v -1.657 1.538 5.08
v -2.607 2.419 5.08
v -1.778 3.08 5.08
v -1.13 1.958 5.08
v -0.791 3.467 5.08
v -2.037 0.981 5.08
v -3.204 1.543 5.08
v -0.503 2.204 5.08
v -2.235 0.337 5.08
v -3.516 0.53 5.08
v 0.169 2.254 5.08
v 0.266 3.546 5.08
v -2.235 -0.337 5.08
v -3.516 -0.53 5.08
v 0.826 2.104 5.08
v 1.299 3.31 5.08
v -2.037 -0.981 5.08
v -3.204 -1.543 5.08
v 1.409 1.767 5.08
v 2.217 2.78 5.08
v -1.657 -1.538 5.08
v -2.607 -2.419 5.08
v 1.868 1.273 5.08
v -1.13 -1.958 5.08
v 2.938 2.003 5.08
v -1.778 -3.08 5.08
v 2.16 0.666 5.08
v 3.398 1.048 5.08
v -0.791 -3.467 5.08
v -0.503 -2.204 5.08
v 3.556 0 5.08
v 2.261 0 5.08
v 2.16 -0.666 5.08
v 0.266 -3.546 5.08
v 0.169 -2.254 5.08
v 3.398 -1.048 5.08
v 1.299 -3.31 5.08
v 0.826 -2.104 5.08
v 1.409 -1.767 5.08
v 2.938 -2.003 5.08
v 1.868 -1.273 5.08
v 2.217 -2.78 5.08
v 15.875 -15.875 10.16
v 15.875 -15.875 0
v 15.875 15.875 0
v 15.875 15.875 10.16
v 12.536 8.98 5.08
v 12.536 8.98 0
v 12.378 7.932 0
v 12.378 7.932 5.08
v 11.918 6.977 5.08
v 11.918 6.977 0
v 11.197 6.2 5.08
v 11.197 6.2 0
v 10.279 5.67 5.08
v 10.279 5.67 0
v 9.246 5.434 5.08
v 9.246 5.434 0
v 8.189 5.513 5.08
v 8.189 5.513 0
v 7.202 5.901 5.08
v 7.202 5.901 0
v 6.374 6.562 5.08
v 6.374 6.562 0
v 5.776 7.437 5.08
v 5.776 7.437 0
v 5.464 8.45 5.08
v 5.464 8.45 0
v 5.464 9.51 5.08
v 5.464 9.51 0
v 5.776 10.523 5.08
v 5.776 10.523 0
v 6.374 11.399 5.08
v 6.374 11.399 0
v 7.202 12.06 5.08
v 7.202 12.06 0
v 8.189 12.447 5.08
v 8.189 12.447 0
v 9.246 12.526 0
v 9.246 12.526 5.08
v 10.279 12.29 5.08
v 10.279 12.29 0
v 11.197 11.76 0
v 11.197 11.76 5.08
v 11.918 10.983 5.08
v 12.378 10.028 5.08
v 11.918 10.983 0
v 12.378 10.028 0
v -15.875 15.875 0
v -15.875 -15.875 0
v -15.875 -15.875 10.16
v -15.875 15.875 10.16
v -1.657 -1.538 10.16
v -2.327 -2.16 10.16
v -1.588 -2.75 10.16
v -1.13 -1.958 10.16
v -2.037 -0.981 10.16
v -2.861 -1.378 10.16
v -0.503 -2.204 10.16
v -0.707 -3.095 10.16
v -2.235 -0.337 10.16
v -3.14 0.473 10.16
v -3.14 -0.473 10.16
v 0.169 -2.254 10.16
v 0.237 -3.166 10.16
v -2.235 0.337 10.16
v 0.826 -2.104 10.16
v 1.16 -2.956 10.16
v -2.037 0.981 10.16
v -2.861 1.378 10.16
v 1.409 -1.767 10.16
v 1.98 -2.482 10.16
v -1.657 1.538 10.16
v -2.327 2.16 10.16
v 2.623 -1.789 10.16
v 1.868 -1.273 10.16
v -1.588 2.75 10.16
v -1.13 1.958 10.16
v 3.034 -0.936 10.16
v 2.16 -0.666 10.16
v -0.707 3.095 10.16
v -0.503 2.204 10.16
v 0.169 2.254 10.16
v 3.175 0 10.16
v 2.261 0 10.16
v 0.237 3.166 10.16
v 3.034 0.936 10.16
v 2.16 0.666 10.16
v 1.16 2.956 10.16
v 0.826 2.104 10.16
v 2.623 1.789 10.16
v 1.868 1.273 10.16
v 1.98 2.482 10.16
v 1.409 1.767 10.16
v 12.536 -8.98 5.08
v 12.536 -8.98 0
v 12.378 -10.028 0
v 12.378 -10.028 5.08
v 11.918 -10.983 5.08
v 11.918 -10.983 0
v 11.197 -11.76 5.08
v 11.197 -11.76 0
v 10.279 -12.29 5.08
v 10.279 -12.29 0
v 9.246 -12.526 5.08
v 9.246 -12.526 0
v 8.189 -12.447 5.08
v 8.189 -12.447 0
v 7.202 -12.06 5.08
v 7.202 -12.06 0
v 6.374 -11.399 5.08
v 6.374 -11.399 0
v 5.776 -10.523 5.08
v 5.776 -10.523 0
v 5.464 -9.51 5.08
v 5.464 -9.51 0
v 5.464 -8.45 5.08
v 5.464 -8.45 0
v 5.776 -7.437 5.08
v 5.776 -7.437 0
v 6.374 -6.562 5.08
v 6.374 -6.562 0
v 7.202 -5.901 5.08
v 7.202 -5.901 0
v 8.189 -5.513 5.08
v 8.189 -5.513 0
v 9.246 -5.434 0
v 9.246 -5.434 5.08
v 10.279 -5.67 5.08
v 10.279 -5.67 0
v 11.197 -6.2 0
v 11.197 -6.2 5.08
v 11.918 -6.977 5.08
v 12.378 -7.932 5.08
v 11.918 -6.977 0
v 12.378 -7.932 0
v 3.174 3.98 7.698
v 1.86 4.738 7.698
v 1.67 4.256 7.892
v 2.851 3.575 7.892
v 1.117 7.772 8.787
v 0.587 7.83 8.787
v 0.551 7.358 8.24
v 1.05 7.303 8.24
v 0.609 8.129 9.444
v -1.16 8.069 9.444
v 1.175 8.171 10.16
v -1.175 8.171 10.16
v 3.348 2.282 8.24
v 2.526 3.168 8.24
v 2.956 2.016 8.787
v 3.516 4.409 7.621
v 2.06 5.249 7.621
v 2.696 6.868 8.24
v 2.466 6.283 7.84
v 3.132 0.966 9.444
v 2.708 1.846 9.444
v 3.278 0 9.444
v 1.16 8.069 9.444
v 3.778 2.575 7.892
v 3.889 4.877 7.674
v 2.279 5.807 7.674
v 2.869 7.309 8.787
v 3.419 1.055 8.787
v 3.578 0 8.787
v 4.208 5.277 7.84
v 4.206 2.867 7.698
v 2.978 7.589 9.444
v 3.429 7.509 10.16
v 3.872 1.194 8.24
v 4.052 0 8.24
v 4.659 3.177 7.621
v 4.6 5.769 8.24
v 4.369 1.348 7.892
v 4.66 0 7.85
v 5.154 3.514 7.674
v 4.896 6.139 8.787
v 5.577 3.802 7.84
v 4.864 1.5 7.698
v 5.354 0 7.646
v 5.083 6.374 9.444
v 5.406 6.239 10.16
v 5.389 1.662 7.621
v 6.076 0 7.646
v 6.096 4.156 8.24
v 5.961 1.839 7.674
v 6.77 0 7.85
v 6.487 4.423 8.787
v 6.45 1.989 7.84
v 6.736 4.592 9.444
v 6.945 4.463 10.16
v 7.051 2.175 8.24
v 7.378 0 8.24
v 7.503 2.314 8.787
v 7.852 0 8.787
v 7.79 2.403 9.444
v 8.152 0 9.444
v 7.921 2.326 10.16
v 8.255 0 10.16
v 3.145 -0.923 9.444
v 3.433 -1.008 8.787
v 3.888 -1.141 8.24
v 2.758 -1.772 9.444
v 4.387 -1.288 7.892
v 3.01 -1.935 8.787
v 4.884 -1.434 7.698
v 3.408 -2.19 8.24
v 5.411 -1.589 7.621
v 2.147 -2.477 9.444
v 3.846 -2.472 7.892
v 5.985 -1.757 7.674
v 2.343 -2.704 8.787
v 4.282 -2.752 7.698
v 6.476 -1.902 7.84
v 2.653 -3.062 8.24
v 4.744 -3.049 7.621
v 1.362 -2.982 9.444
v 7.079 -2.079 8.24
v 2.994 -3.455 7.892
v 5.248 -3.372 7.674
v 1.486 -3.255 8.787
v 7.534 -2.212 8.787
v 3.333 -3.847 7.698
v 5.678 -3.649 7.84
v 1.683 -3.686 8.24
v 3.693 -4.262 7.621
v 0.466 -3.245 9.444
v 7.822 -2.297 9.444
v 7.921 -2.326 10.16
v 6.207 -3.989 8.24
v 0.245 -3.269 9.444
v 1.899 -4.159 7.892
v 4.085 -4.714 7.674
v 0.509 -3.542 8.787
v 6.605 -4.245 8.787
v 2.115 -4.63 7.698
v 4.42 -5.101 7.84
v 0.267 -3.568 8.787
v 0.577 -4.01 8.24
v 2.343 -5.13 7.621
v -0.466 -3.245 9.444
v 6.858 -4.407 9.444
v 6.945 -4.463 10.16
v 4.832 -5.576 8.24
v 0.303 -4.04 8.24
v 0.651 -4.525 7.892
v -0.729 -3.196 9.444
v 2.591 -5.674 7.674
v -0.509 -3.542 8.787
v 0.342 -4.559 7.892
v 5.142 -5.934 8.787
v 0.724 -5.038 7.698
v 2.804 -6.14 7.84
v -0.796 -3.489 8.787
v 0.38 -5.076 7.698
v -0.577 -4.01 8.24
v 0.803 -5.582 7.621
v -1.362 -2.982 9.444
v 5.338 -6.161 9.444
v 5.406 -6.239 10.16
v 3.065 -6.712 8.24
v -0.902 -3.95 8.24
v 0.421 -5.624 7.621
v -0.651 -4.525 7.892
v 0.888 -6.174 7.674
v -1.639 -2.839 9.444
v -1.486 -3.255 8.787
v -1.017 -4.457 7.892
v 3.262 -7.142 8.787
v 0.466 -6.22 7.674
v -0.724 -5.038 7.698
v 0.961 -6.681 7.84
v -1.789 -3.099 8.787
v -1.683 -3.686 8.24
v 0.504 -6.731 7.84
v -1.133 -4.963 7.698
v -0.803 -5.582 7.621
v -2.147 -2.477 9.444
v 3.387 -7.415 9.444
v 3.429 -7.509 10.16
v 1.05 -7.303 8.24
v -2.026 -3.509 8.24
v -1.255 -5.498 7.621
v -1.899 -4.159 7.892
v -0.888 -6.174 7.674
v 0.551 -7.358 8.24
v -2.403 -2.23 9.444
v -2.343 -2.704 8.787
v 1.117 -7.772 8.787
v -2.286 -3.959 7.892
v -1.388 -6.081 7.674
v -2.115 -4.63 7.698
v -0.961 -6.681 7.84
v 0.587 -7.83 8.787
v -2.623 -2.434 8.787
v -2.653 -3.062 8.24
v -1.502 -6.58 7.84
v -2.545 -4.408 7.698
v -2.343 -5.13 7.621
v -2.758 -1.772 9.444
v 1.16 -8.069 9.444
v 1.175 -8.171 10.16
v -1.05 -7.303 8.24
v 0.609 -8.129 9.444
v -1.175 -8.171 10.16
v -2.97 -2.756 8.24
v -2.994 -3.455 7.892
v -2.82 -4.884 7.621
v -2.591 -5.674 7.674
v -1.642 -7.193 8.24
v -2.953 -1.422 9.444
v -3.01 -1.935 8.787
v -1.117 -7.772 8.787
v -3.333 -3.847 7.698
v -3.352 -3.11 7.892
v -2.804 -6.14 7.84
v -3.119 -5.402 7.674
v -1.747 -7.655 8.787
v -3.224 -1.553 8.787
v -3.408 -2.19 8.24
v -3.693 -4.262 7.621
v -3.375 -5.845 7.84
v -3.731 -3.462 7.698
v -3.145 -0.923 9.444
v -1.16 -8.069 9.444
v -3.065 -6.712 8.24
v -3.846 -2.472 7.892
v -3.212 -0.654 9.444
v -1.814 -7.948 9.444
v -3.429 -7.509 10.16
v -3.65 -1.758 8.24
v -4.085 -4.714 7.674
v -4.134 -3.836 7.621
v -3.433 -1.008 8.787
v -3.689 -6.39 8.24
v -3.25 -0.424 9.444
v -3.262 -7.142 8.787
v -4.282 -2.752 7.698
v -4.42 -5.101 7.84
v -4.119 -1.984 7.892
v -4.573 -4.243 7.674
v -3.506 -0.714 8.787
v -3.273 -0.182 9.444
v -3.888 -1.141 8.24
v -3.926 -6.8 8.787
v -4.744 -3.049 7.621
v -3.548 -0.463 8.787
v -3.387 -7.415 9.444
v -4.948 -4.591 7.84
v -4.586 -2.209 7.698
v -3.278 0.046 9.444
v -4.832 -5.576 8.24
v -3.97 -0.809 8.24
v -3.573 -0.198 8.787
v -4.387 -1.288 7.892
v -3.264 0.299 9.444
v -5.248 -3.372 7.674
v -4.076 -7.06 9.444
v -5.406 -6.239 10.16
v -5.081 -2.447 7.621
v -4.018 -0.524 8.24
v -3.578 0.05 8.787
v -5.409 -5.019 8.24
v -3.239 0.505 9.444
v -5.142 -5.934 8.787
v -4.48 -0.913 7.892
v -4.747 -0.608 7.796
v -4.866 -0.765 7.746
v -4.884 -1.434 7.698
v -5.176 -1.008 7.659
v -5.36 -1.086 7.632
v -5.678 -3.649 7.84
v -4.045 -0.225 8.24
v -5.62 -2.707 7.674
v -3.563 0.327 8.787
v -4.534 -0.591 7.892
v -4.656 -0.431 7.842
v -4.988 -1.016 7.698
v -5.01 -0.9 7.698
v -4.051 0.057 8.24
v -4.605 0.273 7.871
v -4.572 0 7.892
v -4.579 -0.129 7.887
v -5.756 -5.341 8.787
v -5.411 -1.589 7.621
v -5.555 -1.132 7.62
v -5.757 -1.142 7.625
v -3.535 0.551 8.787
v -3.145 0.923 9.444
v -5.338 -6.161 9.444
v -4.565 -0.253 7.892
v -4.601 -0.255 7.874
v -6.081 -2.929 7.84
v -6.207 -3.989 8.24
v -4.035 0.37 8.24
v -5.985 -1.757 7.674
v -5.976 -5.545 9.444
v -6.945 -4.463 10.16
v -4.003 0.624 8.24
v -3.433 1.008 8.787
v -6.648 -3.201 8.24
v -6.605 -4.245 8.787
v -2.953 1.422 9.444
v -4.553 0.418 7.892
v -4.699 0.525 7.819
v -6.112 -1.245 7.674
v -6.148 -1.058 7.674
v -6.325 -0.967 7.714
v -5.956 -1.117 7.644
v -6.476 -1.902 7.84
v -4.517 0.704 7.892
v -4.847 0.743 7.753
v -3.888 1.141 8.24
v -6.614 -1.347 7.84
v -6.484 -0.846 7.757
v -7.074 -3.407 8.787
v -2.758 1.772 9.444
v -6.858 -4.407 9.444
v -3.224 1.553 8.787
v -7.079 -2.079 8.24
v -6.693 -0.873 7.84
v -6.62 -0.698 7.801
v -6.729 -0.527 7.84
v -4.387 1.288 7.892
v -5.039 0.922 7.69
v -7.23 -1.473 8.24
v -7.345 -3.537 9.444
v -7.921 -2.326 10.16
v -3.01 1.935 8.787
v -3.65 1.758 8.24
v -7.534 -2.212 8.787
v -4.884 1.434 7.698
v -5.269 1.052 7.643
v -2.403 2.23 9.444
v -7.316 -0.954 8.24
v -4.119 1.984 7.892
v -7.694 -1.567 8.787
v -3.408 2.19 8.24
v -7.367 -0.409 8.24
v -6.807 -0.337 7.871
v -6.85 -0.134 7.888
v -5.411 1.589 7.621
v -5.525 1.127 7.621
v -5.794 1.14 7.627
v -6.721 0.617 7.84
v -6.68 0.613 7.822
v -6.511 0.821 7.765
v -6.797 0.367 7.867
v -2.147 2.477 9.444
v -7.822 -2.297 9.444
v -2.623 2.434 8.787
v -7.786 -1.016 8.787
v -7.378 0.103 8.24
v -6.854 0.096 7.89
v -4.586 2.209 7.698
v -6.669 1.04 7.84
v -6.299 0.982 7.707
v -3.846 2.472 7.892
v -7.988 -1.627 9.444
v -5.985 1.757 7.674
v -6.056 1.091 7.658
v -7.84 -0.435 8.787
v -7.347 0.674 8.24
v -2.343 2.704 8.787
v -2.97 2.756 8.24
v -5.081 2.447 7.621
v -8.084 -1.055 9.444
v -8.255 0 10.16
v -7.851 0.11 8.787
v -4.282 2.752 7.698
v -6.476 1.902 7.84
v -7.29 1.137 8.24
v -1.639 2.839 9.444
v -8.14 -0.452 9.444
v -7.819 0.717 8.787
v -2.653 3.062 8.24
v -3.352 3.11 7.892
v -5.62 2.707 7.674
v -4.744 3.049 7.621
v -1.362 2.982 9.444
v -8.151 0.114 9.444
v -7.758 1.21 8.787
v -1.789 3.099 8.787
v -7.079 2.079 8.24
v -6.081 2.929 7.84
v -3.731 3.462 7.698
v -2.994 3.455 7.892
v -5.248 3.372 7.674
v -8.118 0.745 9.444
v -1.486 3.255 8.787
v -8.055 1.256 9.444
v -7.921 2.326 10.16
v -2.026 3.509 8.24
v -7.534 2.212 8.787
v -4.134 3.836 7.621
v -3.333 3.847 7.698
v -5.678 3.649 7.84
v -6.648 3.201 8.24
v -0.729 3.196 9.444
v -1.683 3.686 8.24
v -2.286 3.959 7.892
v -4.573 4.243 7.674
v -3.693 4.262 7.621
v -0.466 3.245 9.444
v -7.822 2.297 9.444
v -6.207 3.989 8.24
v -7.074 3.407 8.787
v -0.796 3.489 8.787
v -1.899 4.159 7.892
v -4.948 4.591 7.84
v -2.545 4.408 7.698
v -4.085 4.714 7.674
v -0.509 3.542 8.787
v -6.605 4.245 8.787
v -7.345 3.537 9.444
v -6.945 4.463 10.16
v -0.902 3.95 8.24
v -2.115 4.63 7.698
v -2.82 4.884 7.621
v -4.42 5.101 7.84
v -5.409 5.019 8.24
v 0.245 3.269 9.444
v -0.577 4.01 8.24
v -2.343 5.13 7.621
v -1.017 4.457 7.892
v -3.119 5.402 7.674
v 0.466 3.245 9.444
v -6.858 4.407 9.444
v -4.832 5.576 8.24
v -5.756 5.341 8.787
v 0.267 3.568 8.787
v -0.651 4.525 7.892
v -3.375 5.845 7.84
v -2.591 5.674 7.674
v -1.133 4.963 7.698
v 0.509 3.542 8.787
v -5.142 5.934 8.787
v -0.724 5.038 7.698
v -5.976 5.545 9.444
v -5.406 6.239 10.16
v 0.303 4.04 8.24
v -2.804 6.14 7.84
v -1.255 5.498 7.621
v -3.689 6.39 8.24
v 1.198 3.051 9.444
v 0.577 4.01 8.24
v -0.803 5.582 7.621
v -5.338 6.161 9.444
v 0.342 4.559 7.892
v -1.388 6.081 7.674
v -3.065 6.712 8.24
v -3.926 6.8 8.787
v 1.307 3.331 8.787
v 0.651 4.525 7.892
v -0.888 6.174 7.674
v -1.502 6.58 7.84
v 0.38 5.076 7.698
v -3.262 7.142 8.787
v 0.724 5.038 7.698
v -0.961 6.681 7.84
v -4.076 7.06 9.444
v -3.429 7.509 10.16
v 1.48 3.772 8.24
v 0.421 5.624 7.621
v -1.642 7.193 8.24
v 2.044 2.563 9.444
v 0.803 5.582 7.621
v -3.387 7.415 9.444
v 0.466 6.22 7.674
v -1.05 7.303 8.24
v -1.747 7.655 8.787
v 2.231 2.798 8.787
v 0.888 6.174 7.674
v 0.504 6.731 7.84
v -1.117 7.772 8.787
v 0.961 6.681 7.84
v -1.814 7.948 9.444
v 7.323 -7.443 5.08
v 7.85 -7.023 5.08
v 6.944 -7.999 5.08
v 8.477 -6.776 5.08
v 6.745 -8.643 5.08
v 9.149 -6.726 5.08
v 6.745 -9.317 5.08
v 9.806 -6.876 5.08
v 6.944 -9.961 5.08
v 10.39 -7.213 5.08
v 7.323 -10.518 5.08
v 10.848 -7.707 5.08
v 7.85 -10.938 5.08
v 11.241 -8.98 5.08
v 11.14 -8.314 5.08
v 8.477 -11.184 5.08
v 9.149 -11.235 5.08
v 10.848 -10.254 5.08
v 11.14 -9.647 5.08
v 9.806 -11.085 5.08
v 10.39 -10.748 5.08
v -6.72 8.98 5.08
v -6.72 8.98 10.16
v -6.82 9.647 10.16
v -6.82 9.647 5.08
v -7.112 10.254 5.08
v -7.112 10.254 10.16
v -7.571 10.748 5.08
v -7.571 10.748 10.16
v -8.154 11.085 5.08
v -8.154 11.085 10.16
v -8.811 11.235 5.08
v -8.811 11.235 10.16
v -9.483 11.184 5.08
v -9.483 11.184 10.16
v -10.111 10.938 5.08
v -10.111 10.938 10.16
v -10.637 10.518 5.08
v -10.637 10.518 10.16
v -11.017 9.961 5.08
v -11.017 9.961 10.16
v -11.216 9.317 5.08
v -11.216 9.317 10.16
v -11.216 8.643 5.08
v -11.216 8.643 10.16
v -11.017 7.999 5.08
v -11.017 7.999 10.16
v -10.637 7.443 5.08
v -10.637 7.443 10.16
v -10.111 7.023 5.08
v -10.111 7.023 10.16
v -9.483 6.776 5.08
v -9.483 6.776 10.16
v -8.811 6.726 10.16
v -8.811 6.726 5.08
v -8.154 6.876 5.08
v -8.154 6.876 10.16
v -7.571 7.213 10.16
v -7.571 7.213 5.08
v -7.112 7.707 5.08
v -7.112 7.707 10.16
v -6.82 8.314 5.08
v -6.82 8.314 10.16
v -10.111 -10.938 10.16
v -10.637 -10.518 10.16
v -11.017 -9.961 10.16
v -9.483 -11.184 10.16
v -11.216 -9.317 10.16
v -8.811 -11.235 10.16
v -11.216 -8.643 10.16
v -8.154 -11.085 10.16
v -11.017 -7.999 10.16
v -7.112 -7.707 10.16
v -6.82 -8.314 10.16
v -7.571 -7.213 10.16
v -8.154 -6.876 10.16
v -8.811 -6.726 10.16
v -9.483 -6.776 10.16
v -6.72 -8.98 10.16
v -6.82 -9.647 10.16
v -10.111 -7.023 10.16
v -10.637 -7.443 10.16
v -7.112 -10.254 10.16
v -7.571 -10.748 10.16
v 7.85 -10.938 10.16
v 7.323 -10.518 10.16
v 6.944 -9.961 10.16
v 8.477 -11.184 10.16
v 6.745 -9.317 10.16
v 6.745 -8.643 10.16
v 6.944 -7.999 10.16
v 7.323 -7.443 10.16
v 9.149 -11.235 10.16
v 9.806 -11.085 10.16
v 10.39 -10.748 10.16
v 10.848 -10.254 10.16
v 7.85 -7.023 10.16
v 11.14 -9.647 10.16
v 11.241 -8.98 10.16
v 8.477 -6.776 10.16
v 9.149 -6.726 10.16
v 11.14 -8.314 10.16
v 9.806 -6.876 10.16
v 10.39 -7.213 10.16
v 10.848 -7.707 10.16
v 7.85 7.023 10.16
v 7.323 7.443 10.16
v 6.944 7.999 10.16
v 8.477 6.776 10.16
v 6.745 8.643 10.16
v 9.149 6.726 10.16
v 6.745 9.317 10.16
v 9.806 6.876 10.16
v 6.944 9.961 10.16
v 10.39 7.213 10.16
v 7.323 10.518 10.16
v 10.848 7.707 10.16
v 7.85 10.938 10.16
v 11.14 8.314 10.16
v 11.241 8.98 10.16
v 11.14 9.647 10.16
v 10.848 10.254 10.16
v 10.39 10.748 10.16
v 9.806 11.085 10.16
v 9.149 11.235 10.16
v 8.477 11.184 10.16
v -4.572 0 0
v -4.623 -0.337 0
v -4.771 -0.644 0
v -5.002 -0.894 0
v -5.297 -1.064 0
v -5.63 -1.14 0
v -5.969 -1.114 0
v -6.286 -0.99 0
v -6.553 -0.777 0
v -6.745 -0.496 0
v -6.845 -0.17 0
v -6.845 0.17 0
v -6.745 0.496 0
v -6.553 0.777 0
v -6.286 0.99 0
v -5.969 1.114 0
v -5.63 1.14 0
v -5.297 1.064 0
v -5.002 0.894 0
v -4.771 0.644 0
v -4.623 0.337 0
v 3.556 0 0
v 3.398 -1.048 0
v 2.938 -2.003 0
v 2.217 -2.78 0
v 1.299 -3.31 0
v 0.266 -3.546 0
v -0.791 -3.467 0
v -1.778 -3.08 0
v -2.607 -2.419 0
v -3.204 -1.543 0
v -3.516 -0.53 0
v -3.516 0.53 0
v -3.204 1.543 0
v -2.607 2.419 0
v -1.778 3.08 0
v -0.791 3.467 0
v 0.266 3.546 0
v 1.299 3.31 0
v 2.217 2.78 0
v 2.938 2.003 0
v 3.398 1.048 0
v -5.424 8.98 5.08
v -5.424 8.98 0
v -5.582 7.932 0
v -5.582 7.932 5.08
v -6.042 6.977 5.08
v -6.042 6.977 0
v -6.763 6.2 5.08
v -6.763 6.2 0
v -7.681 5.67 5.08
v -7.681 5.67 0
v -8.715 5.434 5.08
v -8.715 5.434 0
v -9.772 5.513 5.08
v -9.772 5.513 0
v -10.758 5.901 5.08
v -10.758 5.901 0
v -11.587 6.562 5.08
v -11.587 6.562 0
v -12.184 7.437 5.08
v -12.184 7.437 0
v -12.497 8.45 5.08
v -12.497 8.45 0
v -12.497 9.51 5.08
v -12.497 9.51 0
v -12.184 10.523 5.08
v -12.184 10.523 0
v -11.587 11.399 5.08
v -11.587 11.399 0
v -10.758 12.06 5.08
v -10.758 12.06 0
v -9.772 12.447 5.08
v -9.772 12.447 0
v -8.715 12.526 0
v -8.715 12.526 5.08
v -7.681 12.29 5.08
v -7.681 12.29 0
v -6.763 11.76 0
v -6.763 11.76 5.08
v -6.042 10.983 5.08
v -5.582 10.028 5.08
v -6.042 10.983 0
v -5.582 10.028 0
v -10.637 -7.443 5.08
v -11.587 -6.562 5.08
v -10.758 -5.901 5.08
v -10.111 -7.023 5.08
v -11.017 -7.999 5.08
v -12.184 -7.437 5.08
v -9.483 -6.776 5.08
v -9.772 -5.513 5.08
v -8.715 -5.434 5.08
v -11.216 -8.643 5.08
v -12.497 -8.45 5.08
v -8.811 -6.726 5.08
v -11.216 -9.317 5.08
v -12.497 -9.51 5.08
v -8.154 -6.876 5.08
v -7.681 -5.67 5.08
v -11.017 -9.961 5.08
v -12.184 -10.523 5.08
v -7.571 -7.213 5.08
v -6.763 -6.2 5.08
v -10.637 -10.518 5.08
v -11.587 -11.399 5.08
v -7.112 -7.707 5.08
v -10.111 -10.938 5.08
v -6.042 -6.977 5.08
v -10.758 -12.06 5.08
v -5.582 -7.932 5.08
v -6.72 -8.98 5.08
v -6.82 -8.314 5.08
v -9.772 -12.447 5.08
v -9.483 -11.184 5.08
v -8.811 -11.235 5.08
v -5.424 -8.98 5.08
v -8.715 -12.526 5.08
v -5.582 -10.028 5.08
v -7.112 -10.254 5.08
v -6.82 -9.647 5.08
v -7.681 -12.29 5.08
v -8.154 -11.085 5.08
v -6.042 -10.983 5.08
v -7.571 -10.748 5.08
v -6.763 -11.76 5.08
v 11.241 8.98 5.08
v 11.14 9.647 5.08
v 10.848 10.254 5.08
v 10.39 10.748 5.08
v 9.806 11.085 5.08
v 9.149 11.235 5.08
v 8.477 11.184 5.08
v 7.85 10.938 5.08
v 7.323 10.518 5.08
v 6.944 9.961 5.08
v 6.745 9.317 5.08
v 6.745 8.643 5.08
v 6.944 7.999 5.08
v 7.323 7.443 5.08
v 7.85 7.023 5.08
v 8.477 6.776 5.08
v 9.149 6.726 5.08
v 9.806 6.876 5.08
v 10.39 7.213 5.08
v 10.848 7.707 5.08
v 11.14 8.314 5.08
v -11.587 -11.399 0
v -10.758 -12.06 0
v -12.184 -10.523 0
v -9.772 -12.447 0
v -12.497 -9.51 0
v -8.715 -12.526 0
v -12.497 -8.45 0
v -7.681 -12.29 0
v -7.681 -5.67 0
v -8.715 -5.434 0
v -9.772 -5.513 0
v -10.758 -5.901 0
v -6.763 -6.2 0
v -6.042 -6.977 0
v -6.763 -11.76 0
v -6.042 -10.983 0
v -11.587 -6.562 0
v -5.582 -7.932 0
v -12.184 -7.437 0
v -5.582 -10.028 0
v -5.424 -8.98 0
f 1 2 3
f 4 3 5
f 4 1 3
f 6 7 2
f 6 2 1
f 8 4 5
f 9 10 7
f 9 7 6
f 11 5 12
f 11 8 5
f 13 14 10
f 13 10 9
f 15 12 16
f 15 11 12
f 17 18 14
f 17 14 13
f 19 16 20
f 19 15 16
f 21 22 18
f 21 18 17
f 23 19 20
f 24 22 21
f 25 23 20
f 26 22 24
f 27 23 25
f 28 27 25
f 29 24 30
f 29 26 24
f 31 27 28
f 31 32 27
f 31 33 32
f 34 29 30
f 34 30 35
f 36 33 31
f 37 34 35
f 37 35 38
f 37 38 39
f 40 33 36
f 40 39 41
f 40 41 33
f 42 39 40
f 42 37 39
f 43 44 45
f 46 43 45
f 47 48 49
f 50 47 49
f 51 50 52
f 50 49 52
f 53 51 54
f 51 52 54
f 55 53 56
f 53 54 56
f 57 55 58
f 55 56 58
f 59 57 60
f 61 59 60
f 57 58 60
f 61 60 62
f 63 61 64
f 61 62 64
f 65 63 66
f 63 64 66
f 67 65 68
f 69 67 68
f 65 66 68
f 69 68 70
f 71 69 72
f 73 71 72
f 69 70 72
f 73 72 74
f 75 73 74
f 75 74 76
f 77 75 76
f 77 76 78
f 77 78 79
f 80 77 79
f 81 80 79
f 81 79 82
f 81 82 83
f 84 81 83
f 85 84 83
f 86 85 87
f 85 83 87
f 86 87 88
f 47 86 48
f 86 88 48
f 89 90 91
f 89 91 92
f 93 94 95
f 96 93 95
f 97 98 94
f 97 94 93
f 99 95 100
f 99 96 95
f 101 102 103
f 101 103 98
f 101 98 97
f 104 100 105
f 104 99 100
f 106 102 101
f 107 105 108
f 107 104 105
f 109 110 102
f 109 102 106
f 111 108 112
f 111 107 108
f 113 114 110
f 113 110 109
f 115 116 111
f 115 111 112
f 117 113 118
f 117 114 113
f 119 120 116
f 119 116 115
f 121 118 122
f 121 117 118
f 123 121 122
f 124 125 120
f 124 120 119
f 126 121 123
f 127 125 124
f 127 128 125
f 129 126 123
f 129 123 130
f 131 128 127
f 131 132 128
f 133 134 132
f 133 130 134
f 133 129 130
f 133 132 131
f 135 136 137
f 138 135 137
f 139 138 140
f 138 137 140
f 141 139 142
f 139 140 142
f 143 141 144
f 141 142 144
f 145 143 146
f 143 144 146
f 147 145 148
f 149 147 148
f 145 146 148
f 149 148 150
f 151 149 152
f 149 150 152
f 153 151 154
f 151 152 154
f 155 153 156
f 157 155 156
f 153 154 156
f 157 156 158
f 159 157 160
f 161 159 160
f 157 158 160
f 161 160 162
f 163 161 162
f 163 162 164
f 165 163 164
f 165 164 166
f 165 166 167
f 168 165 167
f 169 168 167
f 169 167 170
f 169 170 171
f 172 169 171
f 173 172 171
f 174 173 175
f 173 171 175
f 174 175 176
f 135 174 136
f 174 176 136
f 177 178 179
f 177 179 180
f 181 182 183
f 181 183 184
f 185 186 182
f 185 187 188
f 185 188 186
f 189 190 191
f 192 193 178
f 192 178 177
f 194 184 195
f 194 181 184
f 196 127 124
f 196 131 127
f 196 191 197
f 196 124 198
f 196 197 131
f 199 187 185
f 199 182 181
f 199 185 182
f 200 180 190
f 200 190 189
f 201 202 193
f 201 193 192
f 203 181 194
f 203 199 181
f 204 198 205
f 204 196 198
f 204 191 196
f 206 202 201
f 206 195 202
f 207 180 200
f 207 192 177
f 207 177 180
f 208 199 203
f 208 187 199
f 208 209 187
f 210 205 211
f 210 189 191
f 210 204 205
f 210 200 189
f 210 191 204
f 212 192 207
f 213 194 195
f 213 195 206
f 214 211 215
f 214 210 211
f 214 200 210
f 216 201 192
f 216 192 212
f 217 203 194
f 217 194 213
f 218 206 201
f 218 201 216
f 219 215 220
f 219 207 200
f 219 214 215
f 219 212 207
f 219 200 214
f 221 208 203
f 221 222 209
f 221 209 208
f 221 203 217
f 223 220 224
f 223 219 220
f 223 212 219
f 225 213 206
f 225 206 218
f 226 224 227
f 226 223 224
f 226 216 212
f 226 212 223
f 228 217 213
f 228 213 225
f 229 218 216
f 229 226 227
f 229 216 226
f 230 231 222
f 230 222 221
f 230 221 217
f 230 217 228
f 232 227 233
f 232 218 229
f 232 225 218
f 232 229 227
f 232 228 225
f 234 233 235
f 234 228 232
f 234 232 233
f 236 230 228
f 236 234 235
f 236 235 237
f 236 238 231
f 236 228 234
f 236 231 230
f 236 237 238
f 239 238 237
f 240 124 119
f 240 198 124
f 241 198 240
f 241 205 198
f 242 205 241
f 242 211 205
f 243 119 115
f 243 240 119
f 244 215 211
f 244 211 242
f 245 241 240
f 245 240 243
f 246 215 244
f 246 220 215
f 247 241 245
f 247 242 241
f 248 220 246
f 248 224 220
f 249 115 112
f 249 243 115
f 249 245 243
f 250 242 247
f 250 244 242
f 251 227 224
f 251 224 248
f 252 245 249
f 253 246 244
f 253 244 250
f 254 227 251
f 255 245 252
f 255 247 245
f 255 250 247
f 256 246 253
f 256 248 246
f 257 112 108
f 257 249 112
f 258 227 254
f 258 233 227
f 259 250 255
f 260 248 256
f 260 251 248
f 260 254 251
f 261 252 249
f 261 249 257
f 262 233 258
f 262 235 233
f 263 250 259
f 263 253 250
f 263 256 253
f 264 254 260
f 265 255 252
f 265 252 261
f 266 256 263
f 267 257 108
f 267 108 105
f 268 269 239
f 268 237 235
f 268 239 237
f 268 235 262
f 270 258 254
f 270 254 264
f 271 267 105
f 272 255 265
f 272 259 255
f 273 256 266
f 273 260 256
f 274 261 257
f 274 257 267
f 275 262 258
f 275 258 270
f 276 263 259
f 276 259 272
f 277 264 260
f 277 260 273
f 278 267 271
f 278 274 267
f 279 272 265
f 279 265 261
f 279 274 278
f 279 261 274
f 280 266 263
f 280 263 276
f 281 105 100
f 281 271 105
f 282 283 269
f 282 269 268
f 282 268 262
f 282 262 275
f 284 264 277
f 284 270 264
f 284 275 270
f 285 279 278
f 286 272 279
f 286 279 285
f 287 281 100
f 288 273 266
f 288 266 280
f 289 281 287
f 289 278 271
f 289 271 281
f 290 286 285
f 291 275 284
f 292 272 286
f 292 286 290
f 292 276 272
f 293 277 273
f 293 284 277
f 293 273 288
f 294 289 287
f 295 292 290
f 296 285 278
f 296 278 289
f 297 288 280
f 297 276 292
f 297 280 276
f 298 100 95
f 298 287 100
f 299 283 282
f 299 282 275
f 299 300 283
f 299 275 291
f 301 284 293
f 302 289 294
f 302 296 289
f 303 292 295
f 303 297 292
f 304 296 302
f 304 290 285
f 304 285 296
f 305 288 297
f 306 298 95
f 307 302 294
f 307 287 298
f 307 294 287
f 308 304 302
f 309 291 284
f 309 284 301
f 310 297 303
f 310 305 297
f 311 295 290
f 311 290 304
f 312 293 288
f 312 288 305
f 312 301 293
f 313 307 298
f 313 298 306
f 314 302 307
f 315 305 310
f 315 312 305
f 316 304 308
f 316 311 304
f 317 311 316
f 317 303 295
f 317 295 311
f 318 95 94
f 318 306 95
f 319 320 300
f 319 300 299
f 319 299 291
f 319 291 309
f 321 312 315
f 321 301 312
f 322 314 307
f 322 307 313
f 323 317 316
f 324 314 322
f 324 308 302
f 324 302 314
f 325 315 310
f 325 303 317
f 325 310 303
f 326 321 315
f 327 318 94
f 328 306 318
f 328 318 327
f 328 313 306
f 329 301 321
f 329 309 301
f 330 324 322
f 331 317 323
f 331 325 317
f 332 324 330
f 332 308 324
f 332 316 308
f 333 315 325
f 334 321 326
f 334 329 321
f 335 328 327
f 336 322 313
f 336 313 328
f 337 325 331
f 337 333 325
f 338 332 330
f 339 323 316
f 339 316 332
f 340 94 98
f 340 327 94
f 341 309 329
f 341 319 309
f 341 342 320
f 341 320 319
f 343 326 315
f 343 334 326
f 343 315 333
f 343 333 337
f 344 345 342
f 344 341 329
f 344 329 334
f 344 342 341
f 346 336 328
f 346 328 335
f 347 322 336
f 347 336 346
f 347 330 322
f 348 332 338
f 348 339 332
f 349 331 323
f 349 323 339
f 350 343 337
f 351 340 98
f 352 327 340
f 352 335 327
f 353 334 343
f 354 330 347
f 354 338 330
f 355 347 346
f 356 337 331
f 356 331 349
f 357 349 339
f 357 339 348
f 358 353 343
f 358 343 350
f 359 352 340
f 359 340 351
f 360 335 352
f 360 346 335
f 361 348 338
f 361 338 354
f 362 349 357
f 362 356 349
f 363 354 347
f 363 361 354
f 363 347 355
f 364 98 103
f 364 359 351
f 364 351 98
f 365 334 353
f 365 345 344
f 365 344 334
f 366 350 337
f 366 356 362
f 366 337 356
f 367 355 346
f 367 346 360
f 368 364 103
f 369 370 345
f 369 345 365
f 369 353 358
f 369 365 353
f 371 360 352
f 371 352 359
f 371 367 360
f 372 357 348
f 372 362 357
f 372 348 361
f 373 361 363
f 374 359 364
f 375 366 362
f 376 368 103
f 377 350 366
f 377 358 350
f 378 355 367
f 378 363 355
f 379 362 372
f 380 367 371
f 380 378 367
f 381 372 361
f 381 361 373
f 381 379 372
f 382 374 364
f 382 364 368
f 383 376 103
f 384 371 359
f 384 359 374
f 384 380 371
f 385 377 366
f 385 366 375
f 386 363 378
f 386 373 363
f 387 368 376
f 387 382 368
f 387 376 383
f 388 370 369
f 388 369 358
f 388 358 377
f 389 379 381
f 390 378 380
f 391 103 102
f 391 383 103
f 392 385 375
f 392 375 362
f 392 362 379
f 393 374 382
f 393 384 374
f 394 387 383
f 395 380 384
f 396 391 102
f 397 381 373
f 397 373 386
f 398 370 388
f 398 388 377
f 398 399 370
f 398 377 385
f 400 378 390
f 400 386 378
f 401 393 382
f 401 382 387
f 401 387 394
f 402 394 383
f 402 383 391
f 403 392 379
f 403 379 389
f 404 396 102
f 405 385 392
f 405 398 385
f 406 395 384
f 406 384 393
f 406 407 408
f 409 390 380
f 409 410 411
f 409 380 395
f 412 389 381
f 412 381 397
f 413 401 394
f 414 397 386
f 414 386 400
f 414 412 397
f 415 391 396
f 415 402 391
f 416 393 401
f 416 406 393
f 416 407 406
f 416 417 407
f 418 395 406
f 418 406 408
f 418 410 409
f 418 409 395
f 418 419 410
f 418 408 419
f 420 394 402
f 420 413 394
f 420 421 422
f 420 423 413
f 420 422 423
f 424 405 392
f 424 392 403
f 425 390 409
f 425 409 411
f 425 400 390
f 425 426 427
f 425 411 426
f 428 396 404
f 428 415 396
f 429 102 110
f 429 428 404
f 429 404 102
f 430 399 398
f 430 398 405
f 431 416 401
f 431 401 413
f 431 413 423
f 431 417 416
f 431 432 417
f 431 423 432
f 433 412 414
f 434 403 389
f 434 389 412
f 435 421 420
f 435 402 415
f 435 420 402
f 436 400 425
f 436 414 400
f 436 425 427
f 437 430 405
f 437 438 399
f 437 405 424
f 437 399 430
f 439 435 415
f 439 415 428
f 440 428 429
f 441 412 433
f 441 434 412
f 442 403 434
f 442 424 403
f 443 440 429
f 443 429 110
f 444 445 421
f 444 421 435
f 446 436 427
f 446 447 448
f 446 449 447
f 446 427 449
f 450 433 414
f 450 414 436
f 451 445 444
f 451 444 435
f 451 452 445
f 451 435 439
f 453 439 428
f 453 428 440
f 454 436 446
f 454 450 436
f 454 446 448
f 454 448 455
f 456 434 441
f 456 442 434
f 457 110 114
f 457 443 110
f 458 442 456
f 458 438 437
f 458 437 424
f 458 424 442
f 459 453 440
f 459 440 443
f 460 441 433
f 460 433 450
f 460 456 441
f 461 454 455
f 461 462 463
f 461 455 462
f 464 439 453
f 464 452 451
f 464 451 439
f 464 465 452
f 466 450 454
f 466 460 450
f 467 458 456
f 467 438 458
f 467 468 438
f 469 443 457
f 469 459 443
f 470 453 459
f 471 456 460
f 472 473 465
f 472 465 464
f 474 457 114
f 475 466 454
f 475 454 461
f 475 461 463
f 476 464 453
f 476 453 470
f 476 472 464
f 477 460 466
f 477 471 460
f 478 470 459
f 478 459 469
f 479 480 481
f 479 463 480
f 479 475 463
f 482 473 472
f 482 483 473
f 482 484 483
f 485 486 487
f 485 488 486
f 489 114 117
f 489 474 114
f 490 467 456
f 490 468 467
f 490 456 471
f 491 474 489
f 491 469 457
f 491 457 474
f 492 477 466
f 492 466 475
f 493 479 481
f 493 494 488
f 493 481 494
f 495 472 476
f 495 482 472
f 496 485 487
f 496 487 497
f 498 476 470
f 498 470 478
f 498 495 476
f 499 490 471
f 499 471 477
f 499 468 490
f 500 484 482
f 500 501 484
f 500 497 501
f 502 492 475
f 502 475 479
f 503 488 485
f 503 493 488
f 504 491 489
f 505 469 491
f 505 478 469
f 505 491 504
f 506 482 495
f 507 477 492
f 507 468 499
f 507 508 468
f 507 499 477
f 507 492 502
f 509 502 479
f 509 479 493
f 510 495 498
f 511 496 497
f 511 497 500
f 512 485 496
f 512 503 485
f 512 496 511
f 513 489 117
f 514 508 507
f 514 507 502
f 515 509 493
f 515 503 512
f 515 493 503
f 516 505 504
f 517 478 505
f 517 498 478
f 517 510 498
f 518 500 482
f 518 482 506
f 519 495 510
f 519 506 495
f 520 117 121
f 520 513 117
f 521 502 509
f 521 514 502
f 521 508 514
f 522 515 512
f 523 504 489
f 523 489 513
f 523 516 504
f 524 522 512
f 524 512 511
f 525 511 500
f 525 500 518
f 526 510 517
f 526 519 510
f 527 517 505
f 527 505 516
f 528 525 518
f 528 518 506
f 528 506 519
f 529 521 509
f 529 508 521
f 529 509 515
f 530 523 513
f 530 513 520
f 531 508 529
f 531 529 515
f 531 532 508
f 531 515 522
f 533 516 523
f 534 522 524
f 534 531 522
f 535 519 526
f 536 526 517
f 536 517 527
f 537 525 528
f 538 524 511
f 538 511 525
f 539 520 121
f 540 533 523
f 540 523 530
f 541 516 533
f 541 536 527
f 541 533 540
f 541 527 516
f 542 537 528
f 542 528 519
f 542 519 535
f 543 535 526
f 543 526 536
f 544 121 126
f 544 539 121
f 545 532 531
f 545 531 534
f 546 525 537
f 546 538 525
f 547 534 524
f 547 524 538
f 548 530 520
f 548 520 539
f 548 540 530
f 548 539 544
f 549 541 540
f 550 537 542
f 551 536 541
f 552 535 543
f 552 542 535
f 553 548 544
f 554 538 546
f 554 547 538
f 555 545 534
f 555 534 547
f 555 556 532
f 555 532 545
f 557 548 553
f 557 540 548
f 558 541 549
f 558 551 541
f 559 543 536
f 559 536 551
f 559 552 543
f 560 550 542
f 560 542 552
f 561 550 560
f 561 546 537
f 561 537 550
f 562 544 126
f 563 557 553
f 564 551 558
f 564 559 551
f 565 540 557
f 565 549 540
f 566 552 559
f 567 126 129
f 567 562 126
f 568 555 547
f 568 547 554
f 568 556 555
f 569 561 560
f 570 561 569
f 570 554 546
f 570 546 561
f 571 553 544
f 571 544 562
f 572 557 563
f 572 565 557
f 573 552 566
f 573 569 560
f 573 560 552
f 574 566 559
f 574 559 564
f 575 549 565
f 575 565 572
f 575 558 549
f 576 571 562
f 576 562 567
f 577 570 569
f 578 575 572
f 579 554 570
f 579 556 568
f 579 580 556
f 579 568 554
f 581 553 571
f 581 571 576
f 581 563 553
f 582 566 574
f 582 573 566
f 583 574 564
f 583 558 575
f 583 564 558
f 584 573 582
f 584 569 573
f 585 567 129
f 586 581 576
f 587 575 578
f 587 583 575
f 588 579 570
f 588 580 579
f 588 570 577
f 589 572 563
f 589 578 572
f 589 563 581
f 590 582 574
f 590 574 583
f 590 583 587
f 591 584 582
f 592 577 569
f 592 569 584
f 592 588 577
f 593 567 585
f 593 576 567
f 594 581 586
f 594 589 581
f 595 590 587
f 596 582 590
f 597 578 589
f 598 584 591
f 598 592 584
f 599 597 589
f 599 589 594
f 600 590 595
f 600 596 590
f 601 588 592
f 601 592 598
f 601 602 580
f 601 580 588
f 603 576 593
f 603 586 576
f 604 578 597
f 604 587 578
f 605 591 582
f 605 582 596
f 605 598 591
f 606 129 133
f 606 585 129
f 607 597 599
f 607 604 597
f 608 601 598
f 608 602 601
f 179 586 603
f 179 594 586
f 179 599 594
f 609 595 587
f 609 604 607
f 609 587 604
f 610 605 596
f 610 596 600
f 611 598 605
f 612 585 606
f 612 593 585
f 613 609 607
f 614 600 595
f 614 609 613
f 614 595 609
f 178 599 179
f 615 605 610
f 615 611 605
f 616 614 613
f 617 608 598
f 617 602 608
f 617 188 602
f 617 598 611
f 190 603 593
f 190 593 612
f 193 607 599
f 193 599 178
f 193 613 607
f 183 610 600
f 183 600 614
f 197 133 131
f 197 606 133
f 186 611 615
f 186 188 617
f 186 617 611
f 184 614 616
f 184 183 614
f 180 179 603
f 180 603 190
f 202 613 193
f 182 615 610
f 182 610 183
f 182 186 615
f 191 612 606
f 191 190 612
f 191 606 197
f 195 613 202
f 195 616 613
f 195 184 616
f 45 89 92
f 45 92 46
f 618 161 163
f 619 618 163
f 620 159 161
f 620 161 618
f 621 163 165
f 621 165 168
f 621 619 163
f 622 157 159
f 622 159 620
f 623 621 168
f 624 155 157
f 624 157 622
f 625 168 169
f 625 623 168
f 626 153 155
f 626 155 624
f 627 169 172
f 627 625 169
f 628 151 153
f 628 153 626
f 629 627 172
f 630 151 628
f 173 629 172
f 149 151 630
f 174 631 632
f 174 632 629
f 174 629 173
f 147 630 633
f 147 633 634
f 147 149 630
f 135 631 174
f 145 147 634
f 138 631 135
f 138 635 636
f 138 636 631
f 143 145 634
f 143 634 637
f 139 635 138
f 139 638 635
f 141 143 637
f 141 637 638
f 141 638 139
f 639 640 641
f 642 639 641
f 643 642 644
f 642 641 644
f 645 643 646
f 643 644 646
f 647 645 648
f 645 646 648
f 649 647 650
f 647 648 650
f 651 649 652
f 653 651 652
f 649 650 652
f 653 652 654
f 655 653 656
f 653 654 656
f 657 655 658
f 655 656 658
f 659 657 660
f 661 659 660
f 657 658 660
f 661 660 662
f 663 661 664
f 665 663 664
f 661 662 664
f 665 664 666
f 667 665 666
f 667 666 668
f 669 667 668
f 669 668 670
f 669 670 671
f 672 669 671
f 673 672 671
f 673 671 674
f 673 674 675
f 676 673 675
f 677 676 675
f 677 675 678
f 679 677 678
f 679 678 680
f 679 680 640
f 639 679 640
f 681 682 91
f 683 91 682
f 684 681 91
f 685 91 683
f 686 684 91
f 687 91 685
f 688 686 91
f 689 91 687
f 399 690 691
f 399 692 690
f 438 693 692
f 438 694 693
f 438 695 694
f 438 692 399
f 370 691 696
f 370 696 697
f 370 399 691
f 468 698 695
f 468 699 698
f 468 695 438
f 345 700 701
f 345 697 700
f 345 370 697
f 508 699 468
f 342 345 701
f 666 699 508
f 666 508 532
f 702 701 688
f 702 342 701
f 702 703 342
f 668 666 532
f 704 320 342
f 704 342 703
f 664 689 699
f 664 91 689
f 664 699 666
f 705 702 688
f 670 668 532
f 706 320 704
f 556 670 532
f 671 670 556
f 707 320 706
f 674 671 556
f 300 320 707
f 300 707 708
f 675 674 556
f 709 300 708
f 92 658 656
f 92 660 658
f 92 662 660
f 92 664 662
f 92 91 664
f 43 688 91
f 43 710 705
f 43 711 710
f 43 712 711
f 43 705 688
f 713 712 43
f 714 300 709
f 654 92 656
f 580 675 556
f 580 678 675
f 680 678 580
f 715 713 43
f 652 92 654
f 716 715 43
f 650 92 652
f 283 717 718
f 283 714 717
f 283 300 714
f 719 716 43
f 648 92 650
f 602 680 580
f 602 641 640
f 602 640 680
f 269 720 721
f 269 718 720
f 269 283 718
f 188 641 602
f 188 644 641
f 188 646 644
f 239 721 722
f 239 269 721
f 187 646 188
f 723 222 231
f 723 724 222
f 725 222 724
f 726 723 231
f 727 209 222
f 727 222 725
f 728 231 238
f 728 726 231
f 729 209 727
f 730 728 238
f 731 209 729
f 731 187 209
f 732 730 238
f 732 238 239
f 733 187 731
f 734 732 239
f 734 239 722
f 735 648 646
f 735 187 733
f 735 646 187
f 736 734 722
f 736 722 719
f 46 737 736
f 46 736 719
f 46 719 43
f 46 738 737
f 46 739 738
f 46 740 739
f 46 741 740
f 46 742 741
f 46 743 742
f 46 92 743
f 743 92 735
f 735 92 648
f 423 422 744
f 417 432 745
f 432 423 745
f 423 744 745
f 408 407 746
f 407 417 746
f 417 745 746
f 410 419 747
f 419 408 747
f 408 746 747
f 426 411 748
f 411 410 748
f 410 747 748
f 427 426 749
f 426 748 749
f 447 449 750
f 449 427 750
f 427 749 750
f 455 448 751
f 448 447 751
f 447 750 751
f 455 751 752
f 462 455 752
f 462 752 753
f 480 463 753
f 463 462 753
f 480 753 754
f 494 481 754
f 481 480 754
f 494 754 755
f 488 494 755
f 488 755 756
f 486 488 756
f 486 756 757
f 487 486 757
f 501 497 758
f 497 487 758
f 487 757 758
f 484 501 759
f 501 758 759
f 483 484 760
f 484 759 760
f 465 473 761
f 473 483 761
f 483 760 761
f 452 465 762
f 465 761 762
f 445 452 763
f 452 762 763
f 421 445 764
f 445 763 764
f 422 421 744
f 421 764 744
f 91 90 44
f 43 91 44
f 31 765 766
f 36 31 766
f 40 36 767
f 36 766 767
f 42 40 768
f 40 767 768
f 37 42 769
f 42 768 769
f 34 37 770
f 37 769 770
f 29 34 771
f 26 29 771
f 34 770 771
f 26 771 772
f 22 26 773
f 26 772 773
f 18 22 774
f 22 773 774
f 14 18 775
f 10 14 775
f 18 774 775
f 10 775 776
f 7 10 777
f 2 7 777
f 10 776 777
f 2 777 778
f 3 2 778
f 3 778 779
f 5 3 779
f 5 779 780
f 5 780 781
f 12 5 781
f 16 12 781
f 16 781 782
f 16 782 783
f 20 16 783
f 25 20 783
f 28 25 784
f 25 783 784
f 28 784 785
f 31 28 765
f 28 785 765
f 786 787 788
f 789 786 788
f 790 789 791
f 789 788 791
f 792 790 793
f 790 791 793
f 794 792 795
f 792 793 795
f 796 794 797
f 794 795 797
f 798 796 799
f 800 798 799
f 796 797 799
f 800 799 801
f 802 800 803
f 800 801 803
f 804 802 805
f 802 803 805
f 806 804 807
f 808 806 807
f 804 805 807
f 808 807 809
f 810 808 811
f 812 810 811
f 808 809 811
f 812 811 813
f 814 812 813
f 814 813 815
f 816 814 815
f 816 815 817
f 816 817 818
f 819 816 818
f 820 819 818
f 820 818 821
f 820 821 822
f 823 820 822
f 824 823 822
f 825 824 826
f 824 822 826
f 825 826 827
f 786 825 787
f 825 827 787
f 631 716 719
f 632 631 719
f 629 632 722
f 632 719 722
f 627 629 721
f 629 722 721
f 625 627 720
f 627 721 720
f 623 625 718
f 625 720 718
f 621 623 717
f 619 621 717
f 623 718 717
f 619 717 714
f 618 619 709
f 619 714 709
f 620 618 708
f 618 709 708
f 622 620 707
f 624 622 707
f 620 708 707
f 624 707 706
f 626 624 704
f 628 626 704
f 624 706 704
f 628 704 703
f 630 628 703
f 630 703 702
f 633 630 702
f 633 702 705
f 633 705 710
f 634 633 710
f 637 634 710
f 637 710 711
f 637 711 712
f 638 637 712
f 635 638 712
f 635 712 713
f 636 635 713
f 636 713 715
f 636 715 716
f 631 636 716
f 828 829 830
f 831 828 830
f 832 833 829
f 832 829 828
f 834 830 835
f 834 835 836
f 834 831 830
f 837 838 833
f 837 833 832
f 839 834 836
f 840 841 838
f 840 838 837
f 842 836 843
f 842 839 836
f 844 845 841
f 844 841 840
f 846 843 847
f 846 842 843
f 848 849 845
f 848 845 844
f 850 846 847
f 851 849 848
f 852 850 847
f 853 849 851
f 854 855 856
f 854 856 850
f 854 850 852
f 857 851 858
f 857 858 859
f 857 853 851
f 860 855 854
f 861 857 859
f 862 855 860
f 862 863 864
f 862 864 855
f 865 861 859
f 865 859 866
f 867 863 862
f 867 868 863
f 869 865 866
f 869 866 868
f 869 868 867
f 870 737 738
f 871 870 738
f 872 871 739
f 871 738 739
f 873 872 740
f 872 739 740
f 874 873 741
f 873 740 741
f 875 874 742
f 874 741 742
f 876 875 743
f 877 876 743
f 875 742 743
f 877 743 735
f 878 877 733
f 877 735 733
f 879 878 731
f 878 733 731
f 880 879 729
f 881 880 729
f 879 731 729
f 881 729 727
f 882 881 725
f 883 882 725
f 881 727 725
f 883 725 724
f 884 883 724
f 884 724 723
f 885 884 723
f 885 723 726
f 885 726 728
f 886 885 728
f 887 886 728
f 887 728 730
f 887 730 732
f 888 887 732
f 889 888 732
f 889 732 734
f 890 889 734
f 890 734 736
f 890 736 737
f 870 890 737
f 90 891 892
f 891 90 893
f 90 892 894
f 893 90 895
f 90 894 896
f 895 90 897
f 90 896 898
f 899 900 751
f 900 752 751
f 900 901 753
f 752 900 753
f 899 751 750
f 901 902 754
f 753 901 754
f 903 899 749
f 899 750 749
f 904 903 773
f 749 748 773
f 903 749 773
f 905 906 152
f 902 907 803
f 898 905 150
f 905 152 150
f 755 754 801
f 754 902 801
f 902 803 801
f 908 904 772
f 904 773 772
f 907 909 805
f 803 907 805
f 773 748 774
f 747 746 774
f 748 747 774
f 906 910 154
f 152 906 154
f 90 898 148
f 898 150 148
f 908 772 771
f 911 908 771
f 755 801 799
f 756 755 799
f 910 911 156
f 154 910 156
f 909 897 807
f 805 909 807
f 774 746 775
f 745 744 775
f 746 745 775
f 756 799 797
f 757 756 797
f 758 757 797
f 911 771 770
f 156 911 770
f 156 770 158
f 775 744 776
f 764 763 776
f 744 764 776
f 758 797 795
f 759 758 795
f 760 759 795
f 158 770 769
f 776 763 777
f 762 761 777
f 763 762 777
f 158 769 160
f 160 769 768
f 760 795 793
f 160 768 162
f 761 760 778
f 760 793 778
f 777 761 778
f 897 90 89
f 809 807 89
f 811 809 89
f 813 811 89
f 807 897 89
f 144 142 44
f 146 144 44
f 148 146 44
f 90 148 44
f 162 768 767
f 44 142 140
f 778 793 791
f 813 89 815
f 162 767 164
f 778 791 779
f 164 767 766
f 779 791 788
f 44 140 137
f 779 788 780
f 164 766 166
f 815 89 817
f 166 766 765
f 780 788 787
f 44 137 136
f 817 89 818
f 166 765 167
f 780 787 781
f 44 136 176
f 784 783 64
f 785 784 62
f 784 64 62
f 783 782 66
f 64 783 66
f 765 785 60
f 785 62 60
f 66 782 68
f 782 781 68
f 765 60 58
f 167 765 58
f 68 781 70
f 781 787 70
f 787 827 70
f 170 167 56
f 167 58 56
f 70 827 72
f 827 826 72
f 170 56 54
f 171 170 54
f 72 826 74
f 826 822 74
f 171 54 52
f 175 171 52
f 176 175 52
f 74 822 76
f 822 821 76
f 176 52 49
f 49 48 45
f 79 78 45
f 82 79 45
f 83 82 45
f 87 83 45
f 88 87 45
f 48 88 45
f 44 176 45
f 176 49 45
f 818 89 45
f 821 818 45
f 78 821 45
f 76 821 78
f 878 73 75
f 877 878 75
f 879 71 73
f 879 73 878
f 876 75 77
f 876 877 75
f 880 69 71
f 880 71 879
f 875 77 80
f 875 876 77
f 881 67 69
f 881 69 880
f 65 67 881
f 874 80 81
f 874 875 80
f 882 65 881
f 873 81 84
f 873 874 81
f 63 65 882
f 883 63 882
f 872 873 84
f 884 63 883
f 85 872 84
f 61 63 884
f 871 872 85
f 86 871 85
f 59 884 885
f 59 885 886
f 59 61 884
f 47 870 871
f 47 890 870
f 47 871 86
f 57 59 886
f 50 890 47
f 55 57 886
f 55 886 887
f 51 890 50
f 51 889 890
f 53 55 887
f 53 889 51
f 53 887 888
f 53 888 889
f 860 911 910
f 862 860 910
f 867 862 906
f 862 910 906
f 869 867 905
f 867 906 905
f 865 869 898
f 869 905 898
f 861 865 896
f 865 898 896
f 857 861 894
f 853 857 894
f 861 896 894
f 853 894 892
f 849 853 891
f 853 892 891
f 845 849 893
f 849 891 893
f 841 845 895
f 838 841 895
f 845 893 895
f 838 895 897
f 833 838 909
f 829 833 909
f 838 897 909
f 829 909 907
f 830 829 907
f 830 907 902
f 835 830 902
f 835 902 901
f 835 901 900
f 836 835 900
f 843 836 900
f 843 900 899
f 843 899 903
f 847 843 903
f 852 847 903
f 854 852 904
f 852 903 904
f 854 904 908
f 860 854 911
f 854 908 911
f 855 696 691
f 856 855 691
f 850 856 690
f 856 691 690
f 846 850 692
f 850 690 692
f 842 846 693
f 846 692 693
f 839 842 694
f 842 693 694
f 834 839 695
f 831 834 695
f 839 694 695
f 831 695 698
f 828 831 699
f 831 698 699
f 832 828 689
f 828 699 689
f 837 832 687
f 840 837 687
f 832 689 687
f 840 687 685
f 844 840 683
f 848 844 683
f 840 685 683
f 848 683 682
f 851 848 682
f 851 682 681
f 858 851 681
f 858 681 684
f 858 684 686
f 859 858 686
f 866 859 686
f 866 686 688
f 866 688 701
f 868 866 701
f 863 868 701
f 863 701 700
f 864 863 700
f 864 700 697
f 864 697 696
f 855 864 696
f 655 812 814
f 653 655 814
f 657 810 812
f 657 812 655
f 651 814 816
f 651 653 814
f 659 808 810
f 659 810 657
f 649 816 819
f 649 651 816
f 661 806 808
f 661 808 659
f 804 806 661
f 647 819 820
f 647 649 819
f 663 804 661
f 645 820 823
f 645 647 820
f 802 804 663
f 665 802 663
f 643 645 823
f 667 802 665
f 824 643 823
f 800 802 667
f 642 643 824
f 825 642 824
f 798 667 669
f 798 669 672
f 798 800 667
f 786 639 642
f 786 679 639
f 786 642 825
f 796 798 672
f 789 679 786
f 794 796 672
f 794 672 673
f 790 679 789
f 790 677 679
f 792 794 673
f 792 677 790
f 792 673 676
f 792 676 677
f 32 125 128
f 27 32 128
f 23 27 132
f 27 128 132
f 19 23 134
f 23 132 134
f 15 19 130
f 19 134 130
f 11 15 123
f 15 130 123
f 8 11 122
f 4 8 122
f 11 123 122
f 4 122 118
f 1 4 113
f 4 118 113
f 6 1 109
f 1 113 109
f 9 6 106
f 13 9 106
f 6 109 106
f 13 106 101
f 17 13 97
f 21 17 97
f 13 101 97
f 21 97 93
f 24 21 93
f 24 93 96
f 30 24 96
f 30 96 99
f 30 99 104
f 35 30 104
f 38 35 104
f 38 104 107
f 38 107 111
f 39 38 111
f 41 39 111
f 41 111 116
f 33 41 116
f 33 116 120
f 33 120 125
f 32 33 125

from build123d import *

# Parameters (mm, degrees)
F0_W     = 31.75
F0_H     = 31.75
F1_DEPTH = 10.16
F2_R     = 2.54
F4_R     = 2.2606
F5_DEPTH = 25.4
F6_R     = 3.556
F7_DEPTH = 5.08
F8_R     = 1.143
F9_DEPTH = 25.4


with BuildPart() as f1:
    # F0 (on Top) → F1 (new body)
    with BuildSketch(Plane.XY):
        Rectangle(F0_W, F0_H)
    extrude(amount=F1_DEPTH)

    # F2 (on Front) → F3 (revolve, cut)
    with BuildSketch(Plane.XZ):
        with Locations((5.715, 10.16)):
            Circle(F2_R)
    revolve(axis=Axis((0, 0, 8.061379), (0, 0, -1)), mode=Mode.SUBTRACT)

    # F4 (on face) → F5 (cut)
    with BuildSketch(Plane.XY.offset(10.16)):
        Circle(F4_R)
        with Locations((-8.980256, 8.980256)):
            Circle(F4_R)
        with Locations((8.980256, 8.980256)):
            Circle(F4_R)
        with Locations((-8.980256, -8.980256)):
            Circle(F4_R)
        with Locations((8.980256, -8.980256)):
            Circle(F4_R)
    extrude(amount=-F5_DEPTH, mode=Mode.SUBTRACT)

    # F6 (on face) → F7 (cut)
    with BuildSketch(Plane(origin=(0, 0, 0), x_dir=(1, 0, 0), z_dir=(0, 0, -1))):
        Circle(F6_R)
        with Locations((-8.980256, 8.980256)):
            Circle(F6_R)
        with Locations((8.980256, 8.980256)):
            Circle(F6_R)
        with Locations((-8.980256, -8.980256)):
            Circle(F6_R)
        with Locations((8.980256, -8.980256)):
            Circle(F6_R)
    extrude(amount=-F7_DEPTH, mode=Mode.SUBTRACT)

    # F8 (on face) → F9 (cut)
    with BuildSketch(Plane(origin=(0, 0, 0), x_dir=(1, 0, 0), z_dir=(0, 0, -1))):
        with Locations((-5.715, 0)):
            Circle(F8_R)
    extrude(amount=-F9_DEPTH, mode=Mode.SUBTRACT)


solid = f1.part
